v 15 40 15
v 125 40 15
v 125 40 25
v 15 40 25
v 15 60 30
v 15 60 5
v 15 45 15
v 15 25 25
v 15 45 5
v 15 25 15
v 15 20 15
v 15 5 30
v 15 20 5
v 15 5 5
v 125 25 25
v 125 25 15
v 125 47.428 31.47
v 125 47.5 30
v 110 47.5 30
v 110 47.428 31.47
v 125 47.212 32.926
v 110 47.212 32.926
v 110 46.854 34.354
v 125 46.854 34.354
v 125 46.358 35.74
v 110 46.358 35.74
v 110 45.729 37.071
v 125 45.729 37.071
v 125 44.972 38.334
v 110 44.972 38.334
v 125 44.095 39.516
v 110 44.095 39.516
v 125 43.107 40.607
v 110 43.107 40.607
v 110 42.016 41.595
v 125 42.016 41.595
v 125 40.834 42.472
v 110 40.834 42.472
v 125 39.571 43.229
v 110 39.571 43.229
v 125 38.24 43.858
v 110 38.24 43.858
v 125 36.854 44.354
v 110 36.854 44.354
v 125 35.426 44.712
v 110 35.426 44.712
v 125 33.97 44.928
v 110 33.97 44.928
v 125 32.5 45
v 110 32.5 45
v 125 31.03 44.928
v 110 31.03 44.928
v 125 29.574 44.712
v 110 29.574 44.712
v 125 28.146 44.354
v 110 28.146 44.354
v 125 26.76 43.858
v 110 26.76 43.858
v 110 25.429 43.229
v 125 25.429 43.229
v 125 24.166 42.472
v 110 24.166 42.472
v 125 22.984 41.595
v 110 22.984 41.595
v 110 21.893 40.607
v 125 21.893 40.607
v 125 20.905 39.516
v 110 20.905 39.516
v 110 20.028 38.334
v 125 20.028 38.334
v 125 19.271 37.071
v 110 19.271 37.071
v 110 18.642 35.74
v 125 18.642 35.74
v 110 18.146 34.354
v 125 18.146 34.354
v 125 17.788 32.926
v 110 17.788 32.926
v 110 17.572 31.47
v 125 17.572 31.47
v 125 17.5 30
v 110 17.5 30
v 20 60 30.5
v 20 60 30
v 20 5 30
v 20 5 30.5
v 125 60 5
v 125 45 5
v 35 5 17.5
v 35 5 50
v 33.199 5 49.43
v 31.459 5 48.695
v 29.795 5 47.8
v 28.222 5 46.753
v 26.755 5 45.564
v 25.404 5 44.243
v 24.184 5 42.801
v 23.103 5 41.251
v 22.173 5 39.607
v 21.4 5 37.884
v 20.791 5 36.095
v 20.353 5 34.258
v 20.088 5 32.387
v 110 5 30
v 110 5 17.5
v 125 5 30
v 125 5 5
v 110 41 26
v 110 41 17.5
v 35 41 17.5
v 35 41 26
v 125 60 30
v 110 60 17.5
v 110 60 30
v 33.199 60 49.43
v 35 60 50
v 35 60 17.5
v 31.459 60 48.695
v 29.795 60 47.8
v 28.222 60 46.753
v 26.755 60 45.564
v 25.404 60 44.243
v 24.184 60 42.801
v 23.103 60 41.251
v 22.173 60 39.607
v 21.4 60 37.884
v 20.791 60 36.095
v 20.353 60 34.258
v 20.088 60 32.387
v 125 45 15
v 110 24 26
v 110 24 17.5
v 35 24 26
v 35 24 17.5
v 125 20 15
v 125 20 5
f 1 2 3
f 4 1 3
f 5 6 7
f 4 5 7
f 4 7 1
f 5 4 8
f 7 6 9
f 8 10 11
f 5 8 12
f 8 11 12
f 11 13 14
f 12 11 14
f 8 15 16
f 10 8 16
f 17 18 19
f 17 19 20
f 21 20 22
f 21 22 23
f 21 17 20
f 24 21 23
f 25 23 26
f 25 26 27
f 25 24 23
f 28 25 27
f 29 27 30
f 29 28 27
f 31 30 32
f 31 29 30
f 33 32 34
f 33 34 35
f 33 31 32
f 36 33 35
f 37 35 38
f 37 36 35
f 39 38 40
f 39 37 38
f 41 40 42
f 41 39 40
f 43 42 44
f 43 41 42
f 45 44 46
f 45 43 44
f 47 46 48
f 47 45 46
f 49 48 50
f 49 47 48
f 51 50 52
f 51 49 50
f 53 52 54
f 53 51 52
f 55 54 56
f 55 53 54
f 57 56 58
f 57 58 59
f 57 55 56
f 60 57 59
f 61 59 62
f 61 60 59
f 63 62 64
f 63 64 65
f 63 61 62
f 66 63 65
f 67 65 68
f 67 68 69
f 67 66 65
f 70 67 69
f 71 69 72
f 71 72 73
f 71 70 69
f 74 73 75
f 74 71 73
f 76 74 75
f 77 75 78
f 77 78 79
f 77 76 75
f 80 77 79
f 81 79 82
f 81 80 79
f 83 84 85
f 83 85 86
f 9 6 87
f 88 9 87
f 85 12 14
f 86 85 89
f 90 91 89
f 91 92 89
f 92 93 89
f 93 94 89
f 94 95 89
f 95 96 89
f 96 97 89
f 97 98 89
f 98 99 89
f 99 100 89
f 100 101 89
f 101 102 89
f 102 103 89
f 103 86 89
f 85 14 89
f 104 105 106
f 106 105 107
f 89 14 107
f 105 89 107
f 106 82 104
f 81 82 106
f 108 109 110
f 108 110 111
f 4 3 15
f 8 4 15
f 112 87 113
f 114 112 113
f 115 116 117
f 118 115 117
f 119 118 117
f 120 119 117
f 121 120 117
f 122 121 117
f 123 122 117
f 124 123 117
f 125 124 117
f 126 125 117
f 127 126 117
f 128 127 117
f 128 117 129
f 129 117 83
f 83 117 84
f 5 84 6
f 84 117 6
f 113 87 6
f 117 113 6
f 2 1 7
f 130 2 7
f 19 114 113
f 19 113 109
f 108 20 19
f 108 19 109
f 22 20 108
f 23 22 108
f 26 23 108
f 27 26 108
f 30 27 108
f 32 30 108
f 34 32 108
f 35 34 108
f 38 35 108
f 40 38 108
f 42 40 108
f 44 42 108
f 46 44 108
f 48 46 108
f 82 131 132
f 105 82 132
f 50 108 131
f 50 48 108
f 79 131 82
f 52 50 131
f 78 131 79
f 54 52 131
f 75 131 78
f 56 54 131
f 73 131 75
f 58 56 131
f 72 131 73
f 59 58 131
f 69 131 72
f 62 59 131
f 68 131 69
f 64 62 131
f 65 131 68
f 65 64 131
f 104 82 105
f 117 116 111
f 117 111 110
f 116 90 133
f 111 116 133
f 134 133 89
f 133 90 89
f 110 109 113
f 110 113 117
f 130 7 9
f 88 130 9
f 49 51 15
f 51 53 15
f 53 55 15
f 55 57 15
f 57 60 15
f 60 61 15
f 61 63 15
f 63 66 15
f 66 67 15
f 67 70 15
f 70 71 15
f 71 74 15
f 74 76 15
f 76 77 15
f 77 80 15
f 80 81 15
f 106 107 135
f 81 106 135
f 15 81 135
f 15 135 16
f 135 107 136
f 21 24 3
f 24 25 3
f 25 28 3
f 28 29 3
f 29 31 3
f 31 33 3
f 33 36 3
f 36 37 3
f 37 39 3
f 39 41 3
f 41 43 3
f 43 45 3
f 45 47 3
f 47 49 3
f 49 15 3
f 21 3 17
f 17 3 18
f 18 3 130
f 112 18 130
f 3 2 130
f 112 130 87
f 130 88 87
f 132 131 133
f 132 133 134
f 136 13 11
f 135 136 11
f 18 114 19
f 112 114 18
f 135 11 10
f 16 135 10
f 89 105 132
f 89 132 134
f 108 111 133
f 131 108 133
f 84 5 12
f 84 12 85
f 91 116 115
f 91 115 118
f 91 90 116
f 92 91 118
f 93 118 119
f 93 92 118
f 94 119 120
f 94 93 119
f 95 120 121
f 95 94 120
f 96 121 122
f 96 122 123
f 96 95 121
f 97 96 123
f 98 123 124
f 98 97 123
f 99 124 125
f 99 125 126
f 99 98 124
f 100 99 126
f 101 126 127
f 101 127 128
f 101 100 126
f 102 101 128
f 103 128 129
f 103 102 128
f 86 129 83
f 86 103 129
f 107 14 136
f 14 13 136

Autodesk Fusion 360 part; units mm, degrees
sketch "Sketch1" plane through (0, 0, 0) normal (0, 0, 1) x (1, 0, 0)
  line L0 (0, 0) -> (125, 0)
  line L1 (125, 0) -> (125, 65)
  line L2 (125, 65) -> (0, 65)
  line L3 (0, 65) -> (0, 0)
extrude "Extrude1" add sketch "Sketch1" along normal blind 30
sketch "Sketch2" plane through (0, 0, 0) normal (-1, 0, 0) x (0, -1, 0)
  line L0 (-65, 0) -> (0, 0)
  line L1 (0, 0) -> (0, 30)
  line L2 (0, 30) -> (-65, 30)
  line L3 (-65, 30) -> (-65, 0)
  line L4 (-20, 0) -> (-20, 15)
  line L5 (-20, 15) -> (-25, 15)
  line L6 (-25, 15) -> (-25, 25)
  line L7 (-25, 25) -> (-40, 25)
  line L8 (-40, 25) -> (-40, 15)
  line L9 (-40, 15) -> (-45, 15)
  line L10 (-45, 15) -> (-45, 0)
  line L11 (-45, 0) -> (-20, 0)
  dimension "d18" = 15
  dimension "d19" = 15
extrude "Extrude2" cut sketch "Sketch2" against normal blind 125 contours L0 L4 L5 L6 L7 L8 L9 L10 L11
extrude "Extrude3" cut 1 faces at (41.6667, 0, 10) along direction (0, 1, 0) blind 5
extrude "Extrude4" cut 1 faces at (83.3333, 65, 10) along direction (0, -1, 0) blind 5
extrude "Extrude5" cut 1 faces at (0, 55, 15) along direction (1, 0, 0) blind 15
sketch "Sketch3" plane through (0, 5, 0) normal (0, -1, 0) x (1, 0, 0)
  line L0 (15, 30) -> (15, 0)
  line L1 (15, 0) -> (125, 0)
  line L2 (125, 0) -> (125, 30)
  line L3 (125, 30) -> (15, 30)
  line L4 (20, 30) -> (20, 30.5)
  arc A0 (35, 50) -> (20, 30.5) centre (40.175, 30.5) ccw
  line L5 (35, 50) -> (35, 30)
extrude "Extrude6" add sketch "Sketch3" against normal blind 55 contours L3 L4 A0 L5
sketch "Sketch4" plane through (0, 0, 30) normal (0, 0, 1) x (-1, 0, 0)
  line L0 (-35, -60) -> (-35, -5)
  line L1 (-35, -5) -> (-125, -5)
  line L2 (-125, -5) -> (-125, -60)
  line L3 (-125, -60) -> (-35, -60)
sketch "Sketch5" plane through (125, 0, 0) normal (1, 0, 0) x (0, 1, 0)
  line L0 (60, 0) -> (60, 30)
  line L1 (60, 30) -> (5, 30)
  line L2 (5, 30) -> (5, 0)
  line L3 (5, 0) -> (20, 0)
  line L4 (20, 0) -> (20, 15)
  line L5 (20, 15) -> (25, 15)
  line L6 (25, 15) -> (25, 25)
  line L7 (25, 25) -> (40, 25)
  line L8 (40, 25) -> (40, 15)
  line L9 (40, 15) -> (45, 15)
  line L10 (45, 15) -> (45, 0)
  line L11 (45, 0) -> (60, 0)
  circle A0 centre (32.5, 30) radius 15
  dimension "d13" = 30
extrude "Extrude7" add sketch "Sketch5" against normal blind 15 contours L1 A0
sketch "Sketch6" plane through (0, 0, 30) normal (0, 0, 1) x (-1, 0, 0)
  line L0 (-35, -60) -> (-110, -60)
  line L1 (-110, -60) -> (-110, -5)
  line L2 (-110, -5) -> (-35, -5)
  line L3 (-35, -5) -> (-35, -60)
extrude "Extrude8" cut sketch "Sketch6" against normal blind 12.5
extrude "Extrude9" cut 2 faces at (51.6667, 15, 0) (88.3333, 50, 0) along direction (0, 0, 1) blind 5
sketch "Sketch7" plane through (110, 0, 0) normal (-1, 0, 0) x (0, -1, 0)
  arc A0 (-17.5, 30) -> (-47.5, 30) centre (-32.5, 30) ccw
  line L0 (-47.5, 30) -> (-60, 30)
  line L1 (-60, 30) -> (-60, 17.5)
  line L2 (-60, 17.5) -> (-40, 17.5)
  line L3 (-40, 17.5) -> (-40, 25)
  line L4 (-40, 25) -> (-25, 25)
  line L5 (-25, 25) -> (-25, 17.5)
  line L6 (-25, 17.5) -> (-5, 17.5)
  line L7 (-5, 17.5) -> (-5, 30)
  line L8 (-5, 30) -> (-17.5, 30)
  line L9 (-40, 17.5) -> (-41, 17.5)
  line L10 (-41, 17.5) -> (-41, 26)
  line L11 (-41, 26) -> (-24, 26)
  line L12 (-24, 26) -> (-24, 17.5)
  line L13 (-24, 17.5) -> (-25, 17.5)
  line L14 (-25, 17.5) -> (-25, 25)
  line L15 (-40, 25) -> (-40, 17.5)
  dimension "d22" = 1
  dimension "d23" = 8.5
  dimension "d24" = 17
extrude "Extrude10" add sketch "Sketch7" along normal blind 75 contours L2 L3 L4 L5 L6 L9 L10 L11 L12 L13 L14 L15
